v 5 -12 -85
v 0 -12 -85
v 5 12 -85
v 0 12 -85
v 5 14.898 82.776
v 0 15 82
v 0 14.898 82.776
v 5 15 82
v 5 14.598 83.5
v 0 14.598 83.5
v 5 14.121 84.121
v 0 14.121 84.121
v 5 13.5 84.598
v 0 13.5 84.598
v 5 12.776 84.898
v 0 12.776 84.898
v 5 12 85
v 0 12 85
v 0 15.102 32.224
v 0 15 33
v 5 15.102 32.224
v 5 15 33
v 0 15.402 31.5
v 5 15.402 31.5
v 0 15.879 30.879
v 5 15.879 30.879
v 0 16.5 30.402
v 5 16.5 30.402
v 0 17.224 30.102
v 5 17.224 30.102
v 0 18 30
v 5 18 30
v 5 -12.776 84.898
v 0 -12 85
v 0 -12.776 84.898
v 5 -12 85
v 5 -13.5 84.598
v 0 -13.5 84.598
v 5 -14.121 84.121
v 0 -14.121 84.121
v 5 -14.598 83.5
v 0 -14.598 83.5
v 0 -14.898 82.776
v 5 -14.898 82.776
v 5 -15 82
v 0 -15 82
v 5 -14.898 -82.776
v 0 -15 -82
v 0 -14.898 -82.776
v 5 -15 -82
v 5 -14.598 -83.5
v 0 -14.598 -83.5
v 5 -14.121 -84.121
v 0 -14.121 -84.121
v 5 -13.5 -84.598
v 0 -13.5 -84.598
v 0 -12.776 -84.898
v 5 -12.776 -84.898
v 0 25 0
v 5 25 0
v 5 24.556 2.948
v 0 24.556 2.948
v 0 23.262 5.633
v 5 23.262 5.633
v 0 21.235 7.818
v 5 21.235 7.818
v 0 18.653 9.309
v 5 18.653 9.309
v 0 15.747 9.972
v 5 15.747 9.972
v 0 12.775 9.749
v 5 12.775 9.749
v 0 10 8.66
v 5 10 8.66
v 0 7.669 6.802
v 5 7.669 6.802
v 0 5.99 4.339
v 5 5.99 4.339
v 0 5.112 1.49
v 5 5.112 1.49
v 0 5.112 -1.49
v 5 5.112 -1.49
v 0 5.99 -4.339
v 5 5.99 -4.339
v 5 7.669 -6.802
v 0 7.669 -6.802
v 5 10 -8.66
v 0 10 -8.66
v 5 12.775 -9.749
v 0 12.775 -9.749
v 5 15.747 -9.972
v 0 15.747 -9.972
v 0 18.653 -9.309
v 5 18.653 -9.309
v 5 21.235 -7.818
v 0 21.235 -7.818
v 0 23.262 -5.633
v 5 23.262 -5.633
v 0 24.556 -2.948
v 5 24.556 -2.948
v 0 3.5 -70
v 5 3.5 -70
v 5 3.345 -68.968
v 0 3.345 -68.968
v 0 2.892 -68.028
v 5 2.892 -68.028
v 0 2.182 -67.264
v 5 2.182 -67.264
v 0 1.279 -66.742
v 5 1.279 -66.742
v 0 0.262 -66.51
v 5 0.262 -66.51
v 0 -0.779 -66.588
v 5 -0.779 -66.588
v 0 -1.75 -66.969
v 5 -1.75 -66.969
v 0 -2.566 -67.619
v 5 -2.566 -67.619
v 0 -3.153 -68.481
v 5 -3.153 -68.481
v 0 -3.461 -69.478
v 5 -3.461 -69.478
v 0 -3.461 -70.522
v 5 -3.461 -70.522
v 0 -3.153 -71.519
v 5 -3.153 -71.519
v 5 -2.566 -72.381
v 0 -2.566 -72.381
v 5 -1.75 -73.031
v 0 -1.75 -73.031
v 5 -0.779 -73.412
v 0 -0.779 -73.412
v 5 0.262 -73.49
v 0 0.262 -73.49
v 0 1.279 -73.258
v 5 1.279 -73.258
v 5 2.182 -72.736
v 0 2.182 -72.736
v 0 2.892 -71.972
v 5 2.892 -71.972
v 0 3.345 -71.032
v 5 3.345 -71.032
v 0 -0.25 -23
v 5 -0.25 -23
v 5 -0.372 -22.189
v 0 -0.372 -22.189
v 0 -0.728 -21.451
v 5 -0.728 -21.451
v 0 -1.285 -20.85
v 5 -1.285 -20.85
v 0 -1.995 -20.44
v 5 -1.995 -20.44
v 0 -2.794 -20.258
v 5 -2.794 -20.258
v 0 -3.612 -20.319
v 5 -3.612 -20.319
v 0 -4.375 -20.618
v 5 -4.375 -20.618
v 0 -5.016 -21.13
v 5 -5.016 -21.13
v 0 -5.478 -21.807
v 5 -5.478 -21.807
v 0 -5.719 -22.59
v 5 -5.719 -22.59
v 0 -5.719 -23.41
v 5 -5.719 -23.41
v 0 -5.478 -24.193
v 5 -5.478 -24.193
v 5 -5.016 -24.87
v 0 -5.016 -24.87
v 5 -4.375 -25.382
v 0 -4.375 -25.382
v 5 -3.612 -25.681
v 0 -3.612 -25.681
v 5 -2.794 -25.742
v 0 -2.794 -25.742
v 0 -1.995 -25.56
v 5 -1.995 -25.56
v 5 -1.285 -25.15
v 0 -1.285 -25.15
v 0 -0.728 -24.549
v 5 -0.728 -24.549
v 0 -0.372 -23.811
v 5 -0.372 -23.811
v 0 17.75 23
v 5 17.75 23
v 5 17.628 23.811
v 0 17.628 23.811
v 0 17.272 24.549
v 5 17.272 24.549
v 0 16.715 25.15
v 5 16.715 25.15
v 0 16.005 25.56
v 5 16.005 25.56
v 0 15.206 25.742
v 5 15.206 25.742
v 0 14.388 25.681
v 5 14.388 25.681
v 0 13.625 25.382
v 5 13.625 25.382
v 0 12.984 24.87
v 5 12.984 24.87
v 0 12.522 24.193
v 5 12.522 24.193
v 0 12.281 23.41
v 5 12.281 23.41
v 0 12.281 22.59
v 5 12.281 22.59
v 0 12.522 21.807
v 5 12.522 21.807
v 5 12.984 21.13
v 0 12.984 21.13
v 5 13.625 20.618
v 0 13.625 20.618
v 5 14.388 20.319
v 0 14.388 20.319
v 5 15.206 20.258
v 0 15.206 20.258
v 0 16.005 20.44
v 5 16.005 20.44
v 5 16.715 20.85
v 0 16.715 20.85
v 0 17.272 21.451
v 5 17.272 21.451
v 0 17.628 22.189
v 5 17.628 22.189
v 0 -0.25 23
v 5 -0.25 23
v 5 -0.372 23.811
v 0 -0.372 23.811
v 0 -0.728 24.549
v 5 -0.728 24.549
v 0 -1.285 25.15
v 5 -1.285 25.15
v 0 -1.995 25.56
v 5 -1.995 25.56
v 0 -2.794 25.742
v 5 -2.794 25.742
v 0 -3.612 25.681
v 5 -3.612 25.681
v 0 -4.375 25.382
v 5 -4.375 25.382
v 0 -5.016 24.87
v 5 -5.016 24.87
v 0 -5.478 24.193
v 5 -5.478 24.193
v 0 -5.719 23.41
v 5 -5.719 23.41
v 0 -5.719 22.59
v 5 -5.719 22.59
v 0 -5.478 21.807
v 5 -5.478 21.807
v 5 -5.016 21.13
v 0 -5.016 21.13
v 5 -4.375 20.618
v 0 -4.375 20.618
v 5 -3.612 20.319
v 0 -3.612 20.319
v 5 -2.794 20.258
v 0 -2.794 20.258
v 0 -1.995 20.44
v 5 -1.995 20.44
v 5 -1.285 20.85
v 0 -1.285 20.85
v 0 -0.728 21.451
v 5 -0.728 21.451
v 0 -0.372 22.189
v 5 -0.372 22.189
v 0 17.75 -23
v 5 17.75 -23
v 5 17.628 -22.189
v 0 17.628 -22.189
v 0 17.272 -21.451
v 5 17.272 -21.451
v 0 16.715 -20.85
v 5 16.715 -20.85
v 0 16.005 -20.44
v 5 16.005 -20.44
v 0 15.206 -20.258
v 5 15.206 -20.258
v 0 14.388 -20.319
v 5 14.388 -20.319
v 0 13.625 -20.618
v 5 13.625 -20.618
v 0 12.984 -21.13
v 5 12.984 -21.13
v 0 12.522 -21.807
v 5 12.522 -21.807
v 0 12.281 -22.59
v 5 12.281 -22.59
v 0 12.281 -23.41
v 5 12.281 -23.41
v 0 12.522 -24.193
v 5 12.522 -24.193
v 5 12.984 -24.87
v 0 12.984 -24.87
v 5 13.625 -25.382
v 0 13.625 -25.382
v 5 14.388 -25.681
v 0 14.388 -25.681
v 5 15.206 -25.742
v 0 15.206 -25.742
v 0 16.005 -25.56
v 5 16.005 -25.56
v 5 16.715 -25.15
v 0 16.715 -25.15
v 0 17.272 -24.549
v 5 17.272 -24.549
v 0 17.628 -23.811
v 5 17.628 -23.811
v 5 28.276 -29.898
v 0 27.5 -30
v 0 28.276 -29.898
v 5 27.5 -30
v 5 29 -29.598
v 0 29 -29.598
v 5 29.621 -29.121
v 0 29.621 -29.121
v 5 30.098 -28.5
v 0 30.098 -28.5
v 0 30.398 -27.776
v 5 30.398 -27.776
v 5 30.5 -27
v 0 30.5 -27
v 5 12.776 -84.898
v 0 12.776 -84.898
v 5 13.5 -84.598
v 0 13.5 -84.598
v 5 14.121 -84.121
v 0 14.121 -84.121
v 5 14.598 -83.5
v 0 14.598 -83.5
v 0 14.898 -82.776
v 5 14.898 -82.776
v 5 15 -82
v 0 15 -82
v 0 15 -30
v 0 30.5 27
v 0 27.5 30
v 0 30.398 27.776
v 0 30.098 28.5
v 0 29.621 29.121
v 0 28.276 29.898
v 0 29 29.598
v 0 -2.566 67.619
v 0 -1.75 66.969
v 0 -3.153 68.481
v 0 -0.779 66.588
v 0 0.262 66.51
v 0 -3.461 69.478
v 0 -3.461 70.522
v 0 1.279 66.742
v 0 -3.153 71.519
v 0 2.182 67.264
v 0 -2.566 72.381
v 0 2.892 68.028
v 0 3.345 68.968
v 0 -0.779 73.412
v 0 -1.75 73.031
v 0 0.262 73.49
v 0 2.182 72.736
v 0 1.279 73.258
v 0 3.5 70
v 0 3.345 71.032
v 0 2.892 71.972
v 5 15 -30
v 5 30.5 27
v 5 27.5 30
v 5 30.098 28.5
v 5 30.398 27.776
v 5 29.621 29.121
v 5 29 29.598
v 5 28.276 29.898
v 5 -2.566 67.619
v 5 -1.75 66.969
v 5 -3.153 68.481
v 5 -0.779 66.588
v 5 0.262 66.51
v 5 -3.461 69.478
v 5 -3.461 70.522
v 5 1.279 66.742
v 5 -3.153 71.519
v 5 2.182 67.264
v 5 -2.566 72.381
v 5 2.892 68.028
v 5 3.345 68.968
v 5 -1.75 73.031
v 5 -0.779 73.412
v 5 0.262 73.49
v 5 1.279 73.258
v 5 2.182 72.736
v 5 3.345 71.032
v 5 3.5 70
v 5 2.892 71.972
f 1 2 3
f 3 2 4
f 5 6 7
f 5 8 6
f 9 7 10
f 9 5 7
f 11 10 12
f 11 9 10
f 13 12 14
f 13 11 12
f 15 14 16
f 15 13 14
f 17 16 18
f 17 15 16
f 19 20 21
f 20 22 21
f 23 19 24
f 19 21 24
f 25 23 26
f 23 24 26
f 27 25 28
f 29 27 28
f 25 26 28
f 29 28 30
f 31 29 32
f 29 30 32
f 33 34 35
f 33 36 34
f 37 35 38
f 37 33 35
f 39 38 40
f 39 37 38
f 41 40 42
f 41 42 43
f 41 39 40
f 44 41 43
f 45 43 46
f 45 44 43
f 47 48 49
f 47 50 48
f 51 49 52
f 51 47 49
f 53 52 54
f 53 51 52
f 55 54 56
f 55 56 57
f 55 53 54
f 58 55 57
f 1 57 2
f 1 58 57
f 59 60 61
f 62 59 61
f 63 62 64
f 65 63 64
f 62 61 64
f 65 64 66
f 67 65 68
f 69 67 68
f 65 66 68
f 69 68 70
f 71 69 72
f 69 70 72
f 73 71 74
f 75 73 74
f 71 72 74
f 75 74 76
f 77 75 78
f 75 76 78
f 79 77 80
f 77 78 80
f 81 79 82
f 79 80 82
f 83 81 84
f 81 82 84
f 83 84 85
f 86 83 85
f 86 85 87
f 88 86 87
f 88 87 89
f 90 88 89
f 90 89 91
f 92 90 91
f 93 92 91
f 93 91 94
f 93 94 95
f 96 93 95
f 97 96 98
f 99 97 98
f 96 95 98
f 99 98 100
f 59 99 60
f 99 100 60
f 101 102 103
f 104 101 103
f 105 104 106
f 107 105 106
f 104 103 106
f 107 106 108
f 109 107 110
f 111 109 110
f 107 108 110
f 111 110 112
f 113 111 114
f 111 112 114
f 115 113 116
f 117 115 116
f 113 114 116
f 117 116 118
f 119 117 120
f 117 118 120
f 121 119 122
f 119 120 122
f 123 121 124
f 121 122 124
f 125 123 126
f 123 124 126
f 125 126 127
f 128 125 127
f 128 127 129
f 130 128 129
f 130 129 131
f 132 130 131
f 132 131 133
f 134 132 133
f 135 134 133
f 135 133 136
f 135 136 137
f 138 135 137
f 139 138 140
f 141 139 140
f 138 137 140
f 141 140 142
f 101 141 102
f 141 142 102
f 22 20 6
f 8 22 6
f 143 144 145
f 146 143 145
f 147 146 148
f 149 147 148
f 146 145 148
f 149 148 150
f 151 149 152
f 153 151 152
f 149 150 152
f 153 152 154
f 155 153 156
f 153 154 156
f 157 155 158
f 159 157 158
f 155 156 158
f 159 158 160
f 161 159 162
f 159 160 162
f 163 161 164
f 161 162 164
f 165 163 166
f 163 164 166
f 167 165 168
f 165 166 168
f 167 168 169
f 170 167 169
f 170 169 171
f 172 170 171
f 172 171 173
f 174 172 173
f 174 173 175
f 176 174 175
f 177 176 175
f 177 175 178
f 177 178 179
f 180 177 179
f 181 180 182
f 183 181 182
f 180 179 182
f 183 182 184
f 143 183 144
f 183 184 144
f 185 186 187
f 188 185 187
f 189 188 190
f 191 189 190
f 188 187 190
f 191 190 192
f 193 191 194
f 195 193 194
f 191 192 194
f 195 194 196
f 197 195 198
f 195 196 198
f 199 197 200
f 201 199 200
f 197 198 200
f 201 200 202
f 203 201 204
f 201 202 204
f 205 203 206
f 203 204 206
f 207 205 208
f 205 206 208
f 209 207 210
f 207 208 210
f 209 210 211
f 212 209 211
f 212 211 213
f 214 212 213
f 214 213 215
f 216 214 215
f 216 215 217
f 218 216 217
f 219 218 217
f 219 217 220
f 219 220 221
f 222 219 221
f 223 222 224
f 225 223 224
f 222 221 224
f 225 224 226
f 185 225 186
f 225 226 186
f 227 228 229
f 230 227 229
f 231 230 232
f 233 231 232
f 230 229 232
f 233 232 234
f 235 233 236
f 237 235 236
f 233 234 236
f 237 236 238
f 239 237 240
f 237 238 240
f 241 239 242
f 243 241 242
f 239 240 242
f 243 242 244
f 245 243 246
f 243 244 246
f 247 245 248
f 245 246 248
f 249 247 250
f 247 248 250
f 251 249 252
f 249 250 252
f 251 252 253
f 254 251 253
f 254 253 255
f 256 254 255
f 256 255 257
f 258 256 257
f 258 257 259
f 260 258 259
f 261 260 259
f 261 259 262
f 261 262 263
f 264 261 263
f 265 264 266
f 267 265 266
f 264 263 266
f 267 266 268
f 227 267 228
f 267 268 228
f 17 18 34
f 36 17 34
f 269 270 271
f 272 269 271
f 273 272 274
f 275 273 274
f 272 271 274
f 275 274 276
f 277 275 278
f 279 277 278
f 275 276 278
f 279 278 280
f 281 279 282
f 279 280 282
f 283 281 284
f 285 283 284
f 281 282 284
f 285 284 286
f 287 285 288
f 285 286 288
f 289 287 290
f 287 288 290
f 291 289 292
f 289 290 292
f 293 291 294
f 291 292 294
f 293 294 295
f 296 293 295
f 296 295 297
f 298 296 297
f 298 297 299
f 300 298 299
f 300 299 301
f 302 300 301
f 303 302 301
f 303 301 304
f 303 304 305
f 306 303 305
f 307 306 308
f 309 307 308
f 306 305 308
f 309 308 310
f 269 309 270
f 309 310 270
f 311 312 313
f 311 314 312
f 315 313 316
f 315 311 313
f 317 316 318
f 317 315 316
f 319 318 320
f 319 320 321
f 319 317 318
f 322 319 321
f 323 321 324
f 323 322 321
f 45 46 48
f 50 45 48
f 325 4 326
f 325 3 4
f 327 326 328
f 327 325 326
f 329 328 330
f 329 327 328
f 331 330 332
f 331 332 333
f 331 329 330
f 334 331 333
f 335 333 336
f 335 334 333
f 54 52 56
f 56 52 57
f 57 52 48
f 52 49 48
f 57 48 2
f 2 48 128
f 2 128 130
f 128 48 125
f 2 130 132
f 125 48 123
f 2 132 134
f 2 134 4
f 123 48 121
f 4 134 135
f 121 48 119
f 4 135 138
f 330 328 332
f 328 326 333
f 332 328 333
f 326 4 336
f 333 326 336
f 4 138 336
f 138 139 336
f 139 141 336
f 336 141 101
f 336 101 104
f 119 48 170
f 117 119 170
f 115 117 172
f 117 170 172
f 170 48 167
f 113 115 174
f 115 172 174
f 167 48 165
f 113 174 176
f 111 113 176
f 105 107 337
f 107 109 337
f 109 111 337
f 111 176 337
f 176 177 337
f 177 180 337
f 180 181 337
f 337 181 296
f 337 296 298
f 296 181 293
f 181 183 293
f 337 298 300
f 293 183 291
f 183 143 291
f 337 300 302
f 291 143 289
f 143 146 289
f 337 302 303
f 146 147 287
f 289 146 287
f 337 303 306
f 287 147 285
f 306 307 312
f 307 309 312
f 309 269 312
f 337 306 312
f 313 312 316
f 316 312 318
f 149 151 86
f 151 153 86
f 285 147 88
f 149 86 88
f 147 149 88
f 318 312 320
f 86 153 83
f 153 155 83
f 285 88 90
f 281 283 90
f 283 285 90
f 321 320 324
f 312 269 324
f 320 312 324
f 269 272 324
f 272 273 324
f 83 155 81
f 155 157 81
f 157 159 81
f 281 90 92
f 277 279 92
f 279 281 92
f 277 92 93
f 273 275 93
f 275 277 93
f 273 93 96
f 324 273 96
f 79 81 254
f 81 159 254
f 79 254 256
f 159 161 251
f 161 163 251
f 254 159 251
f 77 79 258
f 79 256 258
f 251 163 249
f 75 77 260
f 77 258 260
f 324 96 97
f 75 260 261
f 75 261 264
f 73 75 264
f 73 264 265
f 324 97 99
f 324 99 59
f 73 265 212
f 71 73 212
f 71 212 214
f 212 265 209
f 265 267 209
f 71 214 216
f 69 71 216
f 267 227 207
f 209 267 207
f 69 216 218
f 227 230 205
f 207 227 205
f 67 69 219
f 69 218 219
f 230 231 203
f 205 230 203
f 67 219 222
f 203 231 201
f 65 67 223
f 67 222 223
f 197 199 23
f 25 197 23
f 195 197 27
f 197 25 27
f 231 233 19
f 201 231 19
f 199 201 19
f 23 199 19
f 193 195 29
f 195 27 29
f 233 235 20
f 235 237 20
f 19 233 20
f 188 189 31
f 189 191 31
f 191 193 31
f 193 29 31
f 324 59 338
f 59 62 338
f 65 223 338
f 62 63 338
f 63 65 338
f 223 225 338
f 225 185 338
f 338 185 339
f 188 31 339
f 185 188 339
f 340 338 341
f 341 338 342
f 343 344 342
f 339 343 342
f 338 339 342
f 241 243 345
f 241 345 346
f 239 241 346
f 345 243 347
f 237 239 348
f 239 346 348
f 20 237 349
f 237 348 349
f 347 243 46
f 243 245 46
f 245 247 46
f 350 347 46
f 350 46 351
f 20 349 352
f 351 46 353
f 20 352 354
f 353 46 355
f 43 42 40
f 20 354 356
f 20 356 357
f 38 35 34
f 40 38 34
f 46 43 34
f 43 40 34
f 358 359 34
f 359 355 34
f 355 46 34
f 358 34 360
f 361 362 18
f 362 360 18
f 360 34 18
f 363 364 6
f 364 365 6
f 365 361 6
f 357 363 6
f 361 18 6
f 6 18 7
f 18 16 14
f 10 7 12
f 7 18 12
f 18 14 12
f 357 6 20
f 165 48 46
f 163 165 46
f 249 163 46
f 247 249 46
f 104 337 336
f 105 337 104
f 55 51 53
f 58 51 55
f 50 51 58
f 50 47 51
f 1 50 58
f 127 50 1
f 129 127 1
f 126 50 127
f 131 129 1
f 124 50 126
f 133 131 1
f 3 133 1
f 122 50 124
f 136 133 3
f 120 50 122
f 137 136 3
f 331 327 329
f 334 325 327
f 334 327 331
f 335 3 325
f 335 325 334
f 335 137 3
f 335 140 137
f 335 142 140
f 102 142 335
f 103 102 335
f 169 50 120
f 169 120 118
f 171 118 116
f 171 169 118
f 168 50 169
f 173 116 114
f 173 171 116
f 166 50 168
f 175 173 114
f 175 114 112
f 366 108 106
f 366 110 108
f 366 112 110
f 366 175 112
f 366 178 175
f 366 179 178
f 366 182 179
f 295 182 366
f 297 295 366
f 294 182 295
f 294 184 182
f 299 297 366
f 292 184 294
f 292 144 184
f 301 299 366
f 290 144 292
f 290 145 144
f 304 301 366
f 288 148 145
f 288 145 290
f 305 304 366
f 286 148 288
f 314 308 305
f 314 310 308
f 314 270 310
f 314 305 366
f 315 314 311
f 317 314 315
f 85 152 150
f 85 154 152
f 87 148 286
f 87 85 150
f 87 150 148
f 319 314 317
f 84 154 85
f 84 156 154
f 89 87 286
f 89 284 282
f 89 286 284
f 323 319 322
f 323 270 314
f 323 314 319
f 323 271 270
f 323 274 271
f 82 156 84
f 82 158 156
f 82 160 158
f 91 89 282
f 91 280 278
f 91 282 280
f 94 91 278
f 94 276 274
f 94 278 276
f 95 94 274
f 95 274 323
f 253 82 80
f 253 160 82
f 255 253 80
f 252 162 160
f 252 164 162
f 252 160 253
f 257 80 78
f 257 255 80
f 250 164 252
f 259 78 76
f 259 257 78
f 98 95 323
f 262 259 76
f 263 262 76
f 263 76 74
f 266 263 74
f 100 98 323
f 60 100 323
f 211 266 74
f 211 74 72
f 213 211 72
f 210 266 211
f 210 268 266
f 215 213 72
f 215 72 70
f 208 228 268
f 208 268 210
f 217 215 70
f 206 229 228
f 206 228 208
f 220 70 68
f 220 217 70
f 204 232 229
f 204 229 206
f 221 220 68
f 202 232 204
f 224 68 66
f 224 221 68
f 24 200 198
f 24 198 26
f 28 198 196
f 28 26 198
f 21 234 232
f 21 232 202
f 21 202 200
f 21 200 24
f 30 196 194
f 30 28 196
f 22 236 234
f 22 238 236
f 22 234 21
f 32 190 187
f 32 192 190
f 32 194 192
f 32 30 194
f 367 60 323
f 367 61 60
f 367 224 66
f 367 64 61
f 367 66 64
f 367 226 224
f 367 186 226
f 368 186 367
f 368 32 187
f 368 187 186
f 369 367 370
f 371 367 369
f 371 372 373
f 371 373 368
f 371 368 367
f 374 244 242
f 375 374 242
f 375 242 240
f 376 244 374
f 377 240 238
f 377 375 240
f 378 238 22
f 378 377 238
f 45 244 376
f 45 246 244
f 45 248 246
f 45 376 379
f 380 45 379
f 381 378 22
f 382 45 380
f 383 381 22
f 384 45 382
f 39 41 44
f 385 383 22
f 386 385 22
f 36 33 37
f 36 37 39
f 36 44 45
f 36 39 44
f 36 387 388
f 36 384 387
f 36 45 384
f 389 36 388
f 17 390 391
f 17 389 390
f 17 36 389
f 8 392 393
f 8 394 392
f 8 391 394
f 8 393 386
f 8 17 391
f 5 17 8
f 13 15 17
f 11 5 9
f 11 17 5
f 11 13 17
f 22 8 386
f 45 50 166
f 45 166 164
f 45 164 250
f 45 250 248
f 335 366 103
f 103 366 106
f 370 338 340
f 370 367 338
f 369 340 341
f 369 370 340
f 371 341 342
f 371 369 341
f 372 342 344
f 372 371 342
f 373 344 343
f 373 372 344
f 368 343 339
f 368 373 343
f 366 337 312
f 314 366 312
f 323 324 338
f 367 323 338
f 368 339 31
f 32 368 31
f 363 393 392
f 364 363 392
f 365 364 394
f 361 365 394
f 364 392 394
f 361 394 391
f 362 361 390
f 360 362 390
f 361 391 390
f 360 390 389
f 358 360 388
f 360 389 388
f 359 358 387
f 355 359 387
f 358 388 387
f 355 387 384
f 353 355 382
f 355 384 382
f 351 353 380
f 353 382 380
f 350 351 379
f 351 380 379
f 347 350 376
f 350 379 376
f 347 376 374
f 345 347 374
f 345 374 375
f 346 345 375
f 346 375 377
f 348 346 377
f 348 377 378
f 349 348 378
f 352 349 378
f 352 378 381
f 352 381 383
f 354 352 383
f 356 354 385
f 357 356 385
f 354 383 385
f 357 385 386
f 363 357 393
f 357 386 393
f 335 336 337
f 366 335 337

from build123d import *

# Parameters (mm, degrees)
F1_DEPTH = 5
F2_R     = 3
F3_R     = 3.5
F4_DEPTH = 5
F6_R     = 10
F6_R_2   = 2.75
F7_DEPTH = 5


# Not quite as in the source:
# - two fillets or chamfers of one size are made in one step


with BuildPart() as f1:
    # F0 (on Right) → F1 (new body)
    with BuildSketch(Plane.YZ):
        Polygon((15, 30), (15, 85), (-15, 85), (-15, -85), (15, -85), (15, -30), (30.5, -30), (30.5, 30), align=None)
    extrude(amount=F1_DEPTH)

    # F2
    f2_edges = [f1.edges().sort_by_distance(p)[0] for p in [
        (2.5, -15, 85),
        (2.5, 15, 85),
        (2.5, -15, -85),
        (2.5, 15, 30),
        (2.5, 15, -85),
        (2.5, 30.5, -30),
        (2.5, 30.5, 30),
    ]]
    fillet(f2_edges, radius=F2_R)

    # F3 (on face) → F4 (cut)
    with BuildSketch(Plane.YZ.offset(5)):
        with Locations((0, 70)):
            Circle(F3_R)
        with Locations((0, -70)):
            Circle(F3_R)
    extrude(amount=-F4_DEPTH, mode=Mode.SUBTRACT)

    # F6 (on face) → F7 (cut)
    with BuildSketch(Plane.YZ.offset(5)):
        with Locations((15, 0)):
            Circle(F6_R)
        with Locations((15, 23)):
            Circle(F6_R_2)
        with Locations((15, -23)):
            Circle(F6_R_2)
        with Locations((-3, -23)):
            Circle(F6_R_2)
        with Locations((-3, 23)):
            Circle(F6_R_2)
    extrude(amount=-F7_DEPTH, mode=Mode.SUBTRACT)


solid = f1.part
